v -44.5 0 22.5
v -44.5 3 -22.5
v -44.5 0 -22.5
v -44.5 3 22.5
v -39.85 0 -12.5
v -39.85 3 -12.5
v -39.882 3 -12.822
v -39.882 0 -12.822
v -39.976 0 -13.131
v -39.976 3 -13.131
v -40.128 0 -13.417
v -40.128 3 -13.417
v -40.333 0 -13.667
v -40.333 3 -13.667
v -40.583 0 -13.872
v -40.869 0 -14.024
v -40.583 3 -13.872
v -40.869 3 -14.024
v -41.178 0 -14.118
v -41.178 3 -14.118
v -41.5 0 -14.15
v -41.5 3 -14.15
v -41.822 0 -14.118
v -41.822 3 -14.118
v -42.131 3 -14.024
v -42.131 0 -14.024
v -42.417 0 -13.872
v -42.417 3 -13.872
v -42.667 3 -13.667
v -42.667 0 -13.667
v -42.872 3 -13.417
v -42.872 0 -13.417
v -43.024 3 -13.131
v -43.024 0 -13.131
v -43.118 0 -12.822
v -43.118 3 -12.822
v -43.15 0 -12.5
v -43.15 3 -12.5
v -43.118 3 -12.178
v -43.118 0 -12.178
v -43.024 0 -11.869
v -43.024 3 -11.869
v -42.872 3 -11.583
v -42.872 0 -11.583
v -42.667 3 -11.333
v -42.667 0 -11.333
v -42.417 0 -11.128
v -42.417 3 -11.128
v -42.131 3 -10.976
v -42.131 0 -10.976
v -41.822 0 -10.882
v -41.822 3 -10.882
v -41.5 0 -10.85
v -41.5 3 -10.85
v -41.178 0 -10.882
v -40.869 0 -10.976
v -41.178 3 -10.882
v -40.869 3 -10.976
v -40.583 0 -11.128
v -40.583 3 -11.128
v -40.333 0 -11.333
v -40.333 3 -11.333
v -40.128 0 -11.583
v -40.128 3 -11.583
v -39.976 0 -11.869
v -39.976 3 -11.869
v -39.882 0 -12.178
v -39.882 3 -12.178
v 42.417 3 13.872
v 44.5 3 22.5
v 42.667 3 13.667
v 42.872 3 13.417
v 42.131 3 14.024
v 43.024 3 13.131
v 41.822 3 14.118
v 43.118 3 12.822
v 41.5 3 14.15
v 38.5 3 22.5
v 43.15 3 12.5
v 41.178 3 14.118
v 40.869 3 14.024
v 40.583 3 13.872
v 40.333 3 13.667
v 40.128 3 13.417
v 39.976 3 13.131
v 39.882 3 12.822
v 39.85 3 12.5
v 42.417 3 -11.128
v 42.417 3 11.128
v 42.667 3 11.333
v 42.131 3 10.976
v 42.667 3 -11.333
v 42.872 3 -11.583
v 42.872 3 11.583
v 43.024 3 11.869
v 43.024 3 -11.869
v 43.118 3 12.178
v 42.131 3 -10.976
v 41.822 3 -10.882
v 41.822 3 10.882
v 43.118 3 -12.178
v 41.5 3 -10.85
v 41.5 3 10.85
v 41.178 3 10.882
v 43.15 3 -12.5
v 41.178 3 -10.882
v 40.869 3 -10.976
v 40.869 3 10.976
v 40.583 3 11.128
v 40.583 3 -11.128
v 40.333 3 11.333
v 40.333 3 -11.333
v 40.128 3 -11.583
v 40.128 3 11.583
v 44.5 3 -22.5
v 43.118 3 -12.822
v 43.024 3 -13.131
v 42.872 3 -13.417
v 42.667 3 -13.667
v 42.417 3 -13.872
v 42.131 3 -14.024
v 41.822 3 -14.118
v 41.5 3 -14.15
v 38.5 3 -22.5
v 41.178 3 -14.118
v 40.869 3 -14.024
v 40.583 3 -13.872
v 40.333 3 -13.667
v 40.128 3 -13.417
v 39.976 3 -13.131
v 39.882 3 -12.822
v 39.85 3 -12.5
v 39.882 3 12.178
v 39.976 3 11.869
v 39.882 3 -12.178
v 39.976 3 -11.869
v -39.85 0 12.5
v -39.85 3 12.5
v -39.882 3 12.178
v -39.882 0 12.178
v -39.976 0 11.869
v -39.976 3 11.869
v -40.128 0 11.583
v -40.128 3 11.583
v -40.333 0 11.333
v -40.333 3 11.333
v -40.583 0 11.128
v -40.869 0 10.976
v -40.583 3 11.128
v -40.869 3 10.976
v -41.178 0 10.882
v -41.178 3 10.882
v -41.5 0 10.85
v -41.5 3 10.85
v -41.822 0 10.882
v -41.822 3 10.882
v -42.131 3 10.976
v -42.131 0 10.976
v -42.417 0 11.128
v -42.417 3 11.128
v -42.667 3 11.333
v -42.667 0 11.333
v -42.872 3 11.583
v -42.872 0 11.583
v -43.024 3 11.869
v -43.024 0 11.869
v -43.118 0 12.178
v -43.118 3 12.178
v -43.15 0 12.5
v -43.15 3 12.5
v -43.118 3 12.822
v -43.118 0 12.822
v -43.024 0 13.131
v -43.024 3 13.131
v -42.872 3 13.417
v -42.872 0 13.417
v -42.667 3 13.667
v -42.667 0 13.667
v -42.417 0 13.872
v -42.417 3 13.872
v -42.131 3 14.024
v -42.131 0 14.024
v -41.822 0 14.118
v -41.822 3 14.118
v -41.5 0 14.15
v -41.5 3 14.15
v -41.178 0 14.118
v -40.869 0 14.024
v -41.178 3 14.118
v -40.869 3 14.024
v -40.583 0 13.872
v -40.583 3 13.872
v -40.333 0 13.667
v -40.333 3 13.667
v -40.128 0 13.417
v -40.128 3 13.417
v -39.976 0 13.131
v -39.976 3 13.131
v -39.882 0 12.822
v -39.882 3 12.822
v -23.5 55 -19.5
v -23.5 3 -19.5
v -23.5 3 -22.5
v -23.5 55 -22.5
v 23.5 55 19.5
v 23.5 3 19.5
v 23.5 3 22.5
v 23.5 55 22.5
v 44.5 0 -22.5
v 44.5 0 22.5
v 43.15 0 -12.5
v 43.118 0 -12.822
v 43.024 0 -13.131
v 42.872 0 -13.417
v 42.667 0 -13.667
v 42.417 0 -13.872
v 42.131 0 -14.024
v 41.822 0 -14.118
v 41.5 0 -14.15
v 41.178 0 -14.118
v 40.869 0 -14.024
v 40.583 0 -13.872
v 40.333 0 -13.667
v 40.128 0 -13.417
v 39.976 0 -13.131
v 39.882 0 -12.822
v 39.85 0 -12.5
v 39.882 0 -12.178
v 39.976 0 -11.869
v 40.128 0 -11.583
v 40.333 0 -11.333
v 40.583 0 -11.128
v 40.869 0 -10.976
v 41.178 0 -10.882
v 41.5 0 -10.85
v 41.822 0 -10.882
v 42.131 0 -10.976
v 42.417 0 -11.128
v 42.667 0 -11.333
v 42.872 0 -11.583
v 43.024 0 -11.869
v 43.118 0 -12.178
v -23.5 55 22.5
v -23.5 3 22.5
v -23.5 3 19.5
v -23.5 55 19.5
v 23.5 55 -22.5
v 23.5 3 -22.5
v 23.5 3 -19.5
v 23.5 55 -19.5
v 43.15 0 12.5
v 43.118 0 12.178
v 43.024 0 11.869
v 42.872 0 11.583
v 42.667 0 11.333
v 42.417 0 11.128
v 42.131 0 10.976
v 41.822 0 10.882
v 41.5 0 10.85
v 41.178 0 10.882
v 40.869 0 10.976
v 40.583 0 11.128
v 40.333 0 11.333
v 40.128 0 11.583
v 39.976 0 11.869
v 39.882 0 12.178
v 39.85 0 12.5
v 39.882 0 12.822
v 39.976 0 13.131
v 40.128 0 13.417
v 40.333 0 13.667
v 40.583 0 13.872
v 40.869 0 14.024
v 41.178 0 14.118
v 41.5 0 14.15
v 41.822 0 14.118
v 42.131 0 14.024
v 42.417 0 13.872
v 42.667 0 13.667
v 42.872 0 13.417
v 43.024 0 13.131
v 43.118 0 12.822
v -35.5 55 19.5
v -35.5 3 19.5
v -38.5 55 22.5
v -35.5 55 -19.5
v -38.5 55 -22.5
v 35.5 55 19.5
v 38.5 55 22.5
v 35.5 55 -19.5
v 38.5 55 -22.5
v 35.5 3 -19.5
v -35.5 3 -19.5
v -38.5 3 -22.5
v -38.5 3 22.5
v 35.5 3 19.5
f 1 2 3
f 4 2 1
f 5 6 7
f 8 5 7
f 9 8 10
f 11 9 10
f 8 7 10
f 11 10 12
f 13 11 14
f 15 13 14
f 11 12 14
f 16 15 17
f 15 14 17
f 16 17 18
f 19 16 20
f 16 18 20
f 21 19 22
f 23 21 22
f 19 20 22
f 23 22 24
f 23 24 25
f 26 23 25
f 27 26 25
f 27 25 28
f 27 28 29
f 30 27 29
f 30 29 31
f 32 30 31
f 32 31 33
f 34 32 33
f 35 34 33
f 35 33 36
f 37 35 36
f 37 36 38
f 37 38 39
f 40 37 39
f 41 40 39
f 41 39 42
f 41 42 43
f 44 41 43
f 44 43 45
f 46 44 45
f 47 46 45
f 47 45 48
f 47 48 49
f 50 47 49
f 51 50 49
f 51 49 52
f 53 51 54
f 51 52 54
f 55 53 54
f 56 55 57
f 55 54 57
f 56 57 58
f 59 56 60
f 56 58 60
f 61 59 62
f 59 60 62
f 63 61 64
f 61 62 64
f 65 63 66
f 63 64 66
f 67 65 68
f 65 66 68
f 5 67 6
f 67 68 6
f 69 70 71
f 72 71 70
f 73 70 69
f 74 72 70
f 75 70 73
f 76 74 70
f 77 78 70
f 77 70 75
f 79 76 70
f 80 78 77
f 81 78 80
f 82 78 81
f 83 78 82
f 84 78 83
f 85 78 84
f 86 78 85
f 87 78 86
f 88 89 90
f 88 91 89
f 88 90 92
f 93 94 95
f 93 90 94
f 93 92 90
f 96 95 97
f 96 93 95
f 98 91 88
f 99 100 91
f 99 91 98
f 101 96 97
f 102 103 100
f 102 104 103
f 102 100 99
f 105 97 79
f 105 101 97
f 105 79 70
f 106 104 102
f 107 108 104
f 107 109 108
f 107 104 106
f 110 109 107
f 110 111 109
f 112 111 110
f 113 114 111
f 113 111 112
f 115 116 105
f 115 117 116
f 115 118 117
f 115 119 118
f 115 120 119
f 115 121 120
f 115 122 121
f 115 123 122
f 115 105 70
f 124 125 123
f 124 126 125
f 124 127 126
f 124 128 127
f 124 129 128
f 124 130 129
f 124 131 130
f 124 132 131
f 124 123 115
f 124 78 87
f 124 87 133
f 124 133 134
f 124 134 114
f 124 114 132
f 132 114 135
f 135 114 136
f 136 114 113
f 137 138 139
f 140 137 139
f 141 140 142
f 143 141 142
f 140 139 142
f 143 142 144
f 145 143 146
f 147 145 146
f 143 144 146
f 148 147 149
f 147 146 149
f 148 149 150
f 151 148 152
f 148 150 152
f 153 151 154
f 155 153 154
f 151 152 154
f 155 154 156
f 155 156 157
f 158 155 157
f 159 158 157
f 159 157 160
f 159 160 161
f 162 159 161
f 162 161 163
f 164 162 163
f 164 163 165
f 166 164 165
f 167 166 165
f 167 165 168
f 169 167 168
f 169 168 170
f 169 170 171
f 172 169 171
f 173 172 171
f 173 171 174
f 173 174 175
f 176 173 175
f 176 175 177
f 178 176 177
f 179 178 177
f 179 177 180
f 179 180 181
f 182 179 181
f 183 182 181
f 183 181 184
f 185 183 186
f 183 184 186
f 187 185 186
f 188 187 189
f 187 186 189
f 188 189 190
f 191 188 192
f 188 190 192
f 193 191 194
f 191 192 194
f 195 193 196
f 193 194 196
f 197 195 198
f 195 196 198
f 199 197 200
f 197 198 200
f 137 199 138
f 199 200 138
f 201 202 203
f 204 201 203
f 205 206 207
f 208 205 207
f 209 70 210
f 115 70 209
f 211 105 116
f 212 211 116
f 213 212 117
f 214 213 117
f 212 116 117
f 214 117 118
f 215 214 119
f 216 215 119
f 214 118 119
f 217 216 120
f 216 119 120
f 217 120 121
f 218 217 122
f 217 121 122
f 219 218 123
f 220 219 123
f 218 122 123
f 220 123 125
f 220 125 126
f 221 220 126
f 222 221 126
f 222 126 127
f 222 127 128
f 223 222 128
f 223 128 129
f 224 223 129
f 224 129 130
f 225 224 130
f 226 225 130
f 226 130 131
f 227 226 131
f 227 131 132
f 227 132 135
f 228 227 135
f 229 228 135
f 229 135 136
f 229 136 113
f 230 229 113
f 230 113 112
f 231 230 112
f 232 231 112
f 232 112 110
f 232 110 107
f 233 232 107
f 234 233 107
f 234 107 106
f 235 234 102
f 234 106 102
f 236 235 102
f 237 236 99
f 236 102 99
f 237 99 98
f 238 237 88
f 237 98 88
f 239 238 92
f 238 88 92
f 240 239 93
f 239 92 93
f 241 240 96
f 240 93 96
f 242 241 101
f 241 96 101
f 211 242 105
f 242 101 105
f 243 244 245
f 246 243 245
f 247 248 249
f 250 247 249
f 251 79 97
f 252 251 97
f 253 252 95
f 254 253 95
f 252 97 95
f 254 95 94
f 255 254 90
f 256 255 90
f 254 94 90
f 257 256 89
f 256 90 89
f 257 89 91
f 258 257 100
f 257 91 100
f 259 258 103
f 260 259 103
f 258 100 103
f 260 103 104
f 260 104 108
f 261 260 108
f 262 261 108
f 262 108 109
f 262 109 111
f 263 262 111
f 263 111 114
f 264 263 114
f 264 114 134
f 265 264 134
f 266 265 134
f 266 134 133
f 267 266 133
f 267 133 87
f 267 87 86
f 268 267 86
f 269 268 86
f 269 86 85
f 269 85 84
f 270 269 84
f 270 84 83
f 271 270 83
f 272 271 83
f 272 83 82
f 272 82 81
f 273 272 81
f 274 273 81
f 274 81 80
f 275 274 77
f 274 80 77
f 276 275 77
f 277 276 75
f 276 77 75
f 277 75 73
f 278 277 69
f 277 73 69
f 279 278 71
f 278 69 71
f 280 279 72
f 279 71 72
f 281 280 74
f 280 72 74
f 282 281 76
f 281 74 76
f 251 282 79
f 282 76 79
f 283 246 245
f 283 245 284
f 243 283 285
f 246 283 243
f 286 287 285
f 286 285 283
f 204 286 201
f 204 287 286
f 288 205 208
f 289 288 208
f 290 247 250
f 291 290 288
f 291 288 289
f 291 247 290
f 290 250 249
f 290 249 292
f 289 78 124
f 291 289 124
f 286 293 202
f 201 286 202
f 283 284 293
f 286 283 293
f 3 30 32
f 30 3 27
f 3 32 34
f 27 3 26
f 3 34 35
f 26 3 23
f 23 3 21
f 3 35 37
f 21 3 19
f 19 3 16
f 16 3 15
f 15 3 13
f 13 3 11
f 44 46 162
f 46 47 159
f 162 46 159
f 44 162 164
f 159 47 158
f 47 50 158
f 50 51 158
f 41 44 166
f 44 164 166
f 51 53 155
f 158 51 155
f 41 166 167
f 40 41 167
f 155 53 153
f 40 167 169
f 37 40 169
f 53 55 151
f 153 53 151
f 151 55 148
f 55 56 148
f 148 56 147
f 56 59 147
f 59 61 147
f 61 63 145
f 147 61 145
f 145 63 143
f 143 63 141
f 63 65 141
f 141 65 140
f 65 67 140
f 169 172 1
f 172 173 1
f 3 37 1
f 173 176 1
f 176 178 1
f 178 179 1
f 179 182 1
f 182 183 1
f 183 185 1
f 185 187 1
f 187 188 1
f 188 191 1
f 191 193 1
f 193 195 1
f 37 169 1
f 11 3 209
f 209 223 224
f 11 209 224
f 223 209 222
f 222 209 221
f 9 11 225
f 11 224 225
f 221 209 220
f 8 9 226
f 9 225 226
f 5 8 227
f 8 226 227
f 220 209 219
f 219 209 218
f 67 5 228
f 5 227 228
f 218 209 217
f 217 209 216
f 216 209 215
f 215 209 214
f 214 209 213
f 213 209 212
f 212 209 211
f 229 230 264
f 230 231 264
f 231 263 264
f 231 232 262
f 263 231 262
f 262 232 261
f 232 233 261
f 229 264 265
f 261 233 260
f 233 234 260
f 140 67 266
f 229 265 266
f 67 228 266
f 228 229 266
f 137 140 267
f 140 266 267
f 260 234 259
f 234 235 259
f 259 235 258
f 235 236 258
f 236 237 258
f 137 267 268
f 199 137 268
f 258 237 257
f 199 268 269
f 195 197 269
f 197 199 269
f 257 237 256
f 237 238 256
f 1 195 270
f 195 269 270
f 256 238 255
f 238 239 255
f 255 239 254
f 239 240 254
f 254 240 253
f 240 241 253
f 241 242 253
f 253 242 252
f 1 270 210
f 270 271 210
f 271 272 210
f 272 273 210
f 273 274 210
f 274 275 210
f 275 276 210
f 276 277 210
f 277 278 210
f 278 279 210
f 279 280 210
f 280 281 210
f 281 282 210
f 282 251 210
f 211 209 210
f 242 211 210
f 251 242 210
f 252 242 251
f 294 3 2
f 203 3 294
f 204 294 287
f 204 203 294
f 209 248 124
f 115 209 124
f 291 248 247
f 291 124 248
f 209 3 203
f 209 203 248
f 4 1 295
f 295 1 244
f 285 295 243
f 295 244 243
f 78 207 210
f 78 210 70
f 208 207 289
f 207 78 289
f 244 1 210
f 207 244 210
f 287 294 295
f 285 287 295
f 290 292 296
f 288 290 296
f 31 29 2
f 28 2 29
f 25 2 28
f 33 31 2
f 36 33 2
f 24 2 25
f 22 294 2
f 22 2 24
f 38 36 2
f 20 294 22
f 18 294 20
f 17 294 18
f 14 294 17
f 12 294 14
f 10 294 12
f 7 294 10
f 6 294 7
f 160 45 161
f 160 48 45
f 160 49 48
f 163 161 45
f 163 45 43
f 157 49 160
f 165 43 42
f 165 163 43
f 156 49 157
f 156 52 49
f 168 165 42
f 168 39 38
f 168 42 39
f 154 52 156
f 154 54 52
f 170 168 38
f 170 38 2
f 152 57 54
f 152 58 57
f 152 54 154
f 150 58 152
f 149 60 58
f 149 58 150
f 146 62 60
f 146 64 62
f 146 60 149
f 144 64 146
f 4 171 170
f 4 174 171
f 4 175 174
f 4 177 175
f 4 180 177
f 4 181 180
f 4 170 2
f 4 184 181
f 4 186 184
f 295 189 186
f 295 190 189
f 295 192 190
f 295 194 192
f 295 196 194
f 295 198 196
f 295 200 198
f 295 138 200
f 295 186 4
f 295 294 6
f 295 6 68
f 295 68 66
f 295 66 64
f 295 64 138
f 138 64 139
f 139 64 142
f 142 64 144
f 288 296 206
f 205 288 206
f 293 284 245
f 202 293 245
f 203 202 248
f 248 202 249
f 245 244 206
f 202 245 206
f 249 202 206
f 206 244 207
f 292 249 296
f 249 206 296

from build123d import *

# Parameters (mm, degrees)
EXTRUDE_1_DEPTH     = 55
SKETCH_3_W          = 47
SKETCH_3_H          = 3
EXTRUDE_2_DEPTH     = 3
SKETCH_4_W          = 45
SKETCH_4_H          = 3
EXTRUDE_3_DEPTH     = 6
SKETCH_6_R          = 1.65
CUT_EXTRUDE_1_DEPTH = 6
SKETCH_7_W          = 45
SKETCH_7_H          = 3
EXTRUDE_4_DEPTH     = 6
SKETCH_8_R          = 1.65
CUT_EXTRUDE_2_DEPTH = 6


with BuildPart() as part:
    # 草图1 → 凸台-拉伸1 (new body)
    with BuildSketch(Plane(origin=(0, 0, 0), x_dir=(1, 0, 0), z_dir=(0, 1, 0))):
        Polygon((-38.5, 0), (-35.5, 0), (-35.5, 19.5), (-23.5, 19.5), (-23.5, 22.5), (-38.5, 22.5), align=None)
        Polygon((-35.5, -19.5), (-35.5, 0), (-38.5, 0), (-38.5, -22.5), (-23.5, -22.5), (-23.5, -19.5), align=None)
        Polygon((23.5, 22.5), (23.5, 19.5), (35.5, 19.5), (35.5, -19.5), (23.5, -19.5), (23.5, -22.5), (38.5, -22.5), (38.5, 22.5), align=None)
    extrude(amount=EXTRUDE_1_DEPTH)

    # 草图3 → 凸台-拉伸2 (add)
    with BuildSketch(Plane.XZ):
        with Locations((0, 21)):
            Rectangle(SKETCH_3_W, SKETCH_3_H)
        Polygon((-35.5, 19.5), (-35.5, -19.5), (-23.5, -19.5), (23.5, -19.5), (35.5, -19.5), (35.5, 19.5), (23.5, 19.5), (-23.5, 19.5), align=None)
        with Locations((0, -21)):
            Rectangle(SKETCH_3_W, SKETCH_3_H)
    extrude(amount=-EXTRUDE_2_DEPTH)

    # 草图4 → 凸台-拉伸3 (add)
    with BuildSketch(Plane(origin=(38.5, 0, 0), x_dir=(0, 0, -1), z_dir=(1, 0, 0))):
        with Locations((0, 1.5)):
            Rectangle(SKETCH_4_W, SKETCH_4_H)
    extrude(amount=EXTRUDE_3_DEPTH)

    # 草图6 → 切除-拉伸1 (cut)
    with BuildSketch(Plane(origin=(0, 3, 0), x_dir=(1, 0, 0), z_dir=(0, 1, 0))):
        with Locations((41.5, -12.5)):
            Circle(SKETCH_6_R)
        with Locations((41.5, 12.5)):
            Circle(SKETCH_6_R)
    extrude(amount=-CUT_EXTRUDE_1_DEPTH, mode=Mode.SUBTRACT)

    # 草图7 → 凸台-拉伸4 (add)
    with BuildSketch(Plane.ZY.offset(38.5)):
        with Locations((0, 1.5)):
            Rectangle(SKETCH_7_W, SKETCH_7_H)
    extrude(amount=EXTRUDE_4_DEPTH)

    # 草图8 → 切除-拉伸2 (cut)
    with BuildSketch(Plane(origin=(0, 3, 0), x_dir=(1, 0, 0), z_dir=(0, 1, 0))):
        with Locations((-41.5, 12.5)):
            Circle(SKETCH_8_R)
        with Locations((-41.5, -12.5)):
            Circle(SKETCH_8_R)
    extrude(amount=-CUT_EXTRUDE_2_DEPTH, mode=Mode.SUBTRACT)


solid = part.part
